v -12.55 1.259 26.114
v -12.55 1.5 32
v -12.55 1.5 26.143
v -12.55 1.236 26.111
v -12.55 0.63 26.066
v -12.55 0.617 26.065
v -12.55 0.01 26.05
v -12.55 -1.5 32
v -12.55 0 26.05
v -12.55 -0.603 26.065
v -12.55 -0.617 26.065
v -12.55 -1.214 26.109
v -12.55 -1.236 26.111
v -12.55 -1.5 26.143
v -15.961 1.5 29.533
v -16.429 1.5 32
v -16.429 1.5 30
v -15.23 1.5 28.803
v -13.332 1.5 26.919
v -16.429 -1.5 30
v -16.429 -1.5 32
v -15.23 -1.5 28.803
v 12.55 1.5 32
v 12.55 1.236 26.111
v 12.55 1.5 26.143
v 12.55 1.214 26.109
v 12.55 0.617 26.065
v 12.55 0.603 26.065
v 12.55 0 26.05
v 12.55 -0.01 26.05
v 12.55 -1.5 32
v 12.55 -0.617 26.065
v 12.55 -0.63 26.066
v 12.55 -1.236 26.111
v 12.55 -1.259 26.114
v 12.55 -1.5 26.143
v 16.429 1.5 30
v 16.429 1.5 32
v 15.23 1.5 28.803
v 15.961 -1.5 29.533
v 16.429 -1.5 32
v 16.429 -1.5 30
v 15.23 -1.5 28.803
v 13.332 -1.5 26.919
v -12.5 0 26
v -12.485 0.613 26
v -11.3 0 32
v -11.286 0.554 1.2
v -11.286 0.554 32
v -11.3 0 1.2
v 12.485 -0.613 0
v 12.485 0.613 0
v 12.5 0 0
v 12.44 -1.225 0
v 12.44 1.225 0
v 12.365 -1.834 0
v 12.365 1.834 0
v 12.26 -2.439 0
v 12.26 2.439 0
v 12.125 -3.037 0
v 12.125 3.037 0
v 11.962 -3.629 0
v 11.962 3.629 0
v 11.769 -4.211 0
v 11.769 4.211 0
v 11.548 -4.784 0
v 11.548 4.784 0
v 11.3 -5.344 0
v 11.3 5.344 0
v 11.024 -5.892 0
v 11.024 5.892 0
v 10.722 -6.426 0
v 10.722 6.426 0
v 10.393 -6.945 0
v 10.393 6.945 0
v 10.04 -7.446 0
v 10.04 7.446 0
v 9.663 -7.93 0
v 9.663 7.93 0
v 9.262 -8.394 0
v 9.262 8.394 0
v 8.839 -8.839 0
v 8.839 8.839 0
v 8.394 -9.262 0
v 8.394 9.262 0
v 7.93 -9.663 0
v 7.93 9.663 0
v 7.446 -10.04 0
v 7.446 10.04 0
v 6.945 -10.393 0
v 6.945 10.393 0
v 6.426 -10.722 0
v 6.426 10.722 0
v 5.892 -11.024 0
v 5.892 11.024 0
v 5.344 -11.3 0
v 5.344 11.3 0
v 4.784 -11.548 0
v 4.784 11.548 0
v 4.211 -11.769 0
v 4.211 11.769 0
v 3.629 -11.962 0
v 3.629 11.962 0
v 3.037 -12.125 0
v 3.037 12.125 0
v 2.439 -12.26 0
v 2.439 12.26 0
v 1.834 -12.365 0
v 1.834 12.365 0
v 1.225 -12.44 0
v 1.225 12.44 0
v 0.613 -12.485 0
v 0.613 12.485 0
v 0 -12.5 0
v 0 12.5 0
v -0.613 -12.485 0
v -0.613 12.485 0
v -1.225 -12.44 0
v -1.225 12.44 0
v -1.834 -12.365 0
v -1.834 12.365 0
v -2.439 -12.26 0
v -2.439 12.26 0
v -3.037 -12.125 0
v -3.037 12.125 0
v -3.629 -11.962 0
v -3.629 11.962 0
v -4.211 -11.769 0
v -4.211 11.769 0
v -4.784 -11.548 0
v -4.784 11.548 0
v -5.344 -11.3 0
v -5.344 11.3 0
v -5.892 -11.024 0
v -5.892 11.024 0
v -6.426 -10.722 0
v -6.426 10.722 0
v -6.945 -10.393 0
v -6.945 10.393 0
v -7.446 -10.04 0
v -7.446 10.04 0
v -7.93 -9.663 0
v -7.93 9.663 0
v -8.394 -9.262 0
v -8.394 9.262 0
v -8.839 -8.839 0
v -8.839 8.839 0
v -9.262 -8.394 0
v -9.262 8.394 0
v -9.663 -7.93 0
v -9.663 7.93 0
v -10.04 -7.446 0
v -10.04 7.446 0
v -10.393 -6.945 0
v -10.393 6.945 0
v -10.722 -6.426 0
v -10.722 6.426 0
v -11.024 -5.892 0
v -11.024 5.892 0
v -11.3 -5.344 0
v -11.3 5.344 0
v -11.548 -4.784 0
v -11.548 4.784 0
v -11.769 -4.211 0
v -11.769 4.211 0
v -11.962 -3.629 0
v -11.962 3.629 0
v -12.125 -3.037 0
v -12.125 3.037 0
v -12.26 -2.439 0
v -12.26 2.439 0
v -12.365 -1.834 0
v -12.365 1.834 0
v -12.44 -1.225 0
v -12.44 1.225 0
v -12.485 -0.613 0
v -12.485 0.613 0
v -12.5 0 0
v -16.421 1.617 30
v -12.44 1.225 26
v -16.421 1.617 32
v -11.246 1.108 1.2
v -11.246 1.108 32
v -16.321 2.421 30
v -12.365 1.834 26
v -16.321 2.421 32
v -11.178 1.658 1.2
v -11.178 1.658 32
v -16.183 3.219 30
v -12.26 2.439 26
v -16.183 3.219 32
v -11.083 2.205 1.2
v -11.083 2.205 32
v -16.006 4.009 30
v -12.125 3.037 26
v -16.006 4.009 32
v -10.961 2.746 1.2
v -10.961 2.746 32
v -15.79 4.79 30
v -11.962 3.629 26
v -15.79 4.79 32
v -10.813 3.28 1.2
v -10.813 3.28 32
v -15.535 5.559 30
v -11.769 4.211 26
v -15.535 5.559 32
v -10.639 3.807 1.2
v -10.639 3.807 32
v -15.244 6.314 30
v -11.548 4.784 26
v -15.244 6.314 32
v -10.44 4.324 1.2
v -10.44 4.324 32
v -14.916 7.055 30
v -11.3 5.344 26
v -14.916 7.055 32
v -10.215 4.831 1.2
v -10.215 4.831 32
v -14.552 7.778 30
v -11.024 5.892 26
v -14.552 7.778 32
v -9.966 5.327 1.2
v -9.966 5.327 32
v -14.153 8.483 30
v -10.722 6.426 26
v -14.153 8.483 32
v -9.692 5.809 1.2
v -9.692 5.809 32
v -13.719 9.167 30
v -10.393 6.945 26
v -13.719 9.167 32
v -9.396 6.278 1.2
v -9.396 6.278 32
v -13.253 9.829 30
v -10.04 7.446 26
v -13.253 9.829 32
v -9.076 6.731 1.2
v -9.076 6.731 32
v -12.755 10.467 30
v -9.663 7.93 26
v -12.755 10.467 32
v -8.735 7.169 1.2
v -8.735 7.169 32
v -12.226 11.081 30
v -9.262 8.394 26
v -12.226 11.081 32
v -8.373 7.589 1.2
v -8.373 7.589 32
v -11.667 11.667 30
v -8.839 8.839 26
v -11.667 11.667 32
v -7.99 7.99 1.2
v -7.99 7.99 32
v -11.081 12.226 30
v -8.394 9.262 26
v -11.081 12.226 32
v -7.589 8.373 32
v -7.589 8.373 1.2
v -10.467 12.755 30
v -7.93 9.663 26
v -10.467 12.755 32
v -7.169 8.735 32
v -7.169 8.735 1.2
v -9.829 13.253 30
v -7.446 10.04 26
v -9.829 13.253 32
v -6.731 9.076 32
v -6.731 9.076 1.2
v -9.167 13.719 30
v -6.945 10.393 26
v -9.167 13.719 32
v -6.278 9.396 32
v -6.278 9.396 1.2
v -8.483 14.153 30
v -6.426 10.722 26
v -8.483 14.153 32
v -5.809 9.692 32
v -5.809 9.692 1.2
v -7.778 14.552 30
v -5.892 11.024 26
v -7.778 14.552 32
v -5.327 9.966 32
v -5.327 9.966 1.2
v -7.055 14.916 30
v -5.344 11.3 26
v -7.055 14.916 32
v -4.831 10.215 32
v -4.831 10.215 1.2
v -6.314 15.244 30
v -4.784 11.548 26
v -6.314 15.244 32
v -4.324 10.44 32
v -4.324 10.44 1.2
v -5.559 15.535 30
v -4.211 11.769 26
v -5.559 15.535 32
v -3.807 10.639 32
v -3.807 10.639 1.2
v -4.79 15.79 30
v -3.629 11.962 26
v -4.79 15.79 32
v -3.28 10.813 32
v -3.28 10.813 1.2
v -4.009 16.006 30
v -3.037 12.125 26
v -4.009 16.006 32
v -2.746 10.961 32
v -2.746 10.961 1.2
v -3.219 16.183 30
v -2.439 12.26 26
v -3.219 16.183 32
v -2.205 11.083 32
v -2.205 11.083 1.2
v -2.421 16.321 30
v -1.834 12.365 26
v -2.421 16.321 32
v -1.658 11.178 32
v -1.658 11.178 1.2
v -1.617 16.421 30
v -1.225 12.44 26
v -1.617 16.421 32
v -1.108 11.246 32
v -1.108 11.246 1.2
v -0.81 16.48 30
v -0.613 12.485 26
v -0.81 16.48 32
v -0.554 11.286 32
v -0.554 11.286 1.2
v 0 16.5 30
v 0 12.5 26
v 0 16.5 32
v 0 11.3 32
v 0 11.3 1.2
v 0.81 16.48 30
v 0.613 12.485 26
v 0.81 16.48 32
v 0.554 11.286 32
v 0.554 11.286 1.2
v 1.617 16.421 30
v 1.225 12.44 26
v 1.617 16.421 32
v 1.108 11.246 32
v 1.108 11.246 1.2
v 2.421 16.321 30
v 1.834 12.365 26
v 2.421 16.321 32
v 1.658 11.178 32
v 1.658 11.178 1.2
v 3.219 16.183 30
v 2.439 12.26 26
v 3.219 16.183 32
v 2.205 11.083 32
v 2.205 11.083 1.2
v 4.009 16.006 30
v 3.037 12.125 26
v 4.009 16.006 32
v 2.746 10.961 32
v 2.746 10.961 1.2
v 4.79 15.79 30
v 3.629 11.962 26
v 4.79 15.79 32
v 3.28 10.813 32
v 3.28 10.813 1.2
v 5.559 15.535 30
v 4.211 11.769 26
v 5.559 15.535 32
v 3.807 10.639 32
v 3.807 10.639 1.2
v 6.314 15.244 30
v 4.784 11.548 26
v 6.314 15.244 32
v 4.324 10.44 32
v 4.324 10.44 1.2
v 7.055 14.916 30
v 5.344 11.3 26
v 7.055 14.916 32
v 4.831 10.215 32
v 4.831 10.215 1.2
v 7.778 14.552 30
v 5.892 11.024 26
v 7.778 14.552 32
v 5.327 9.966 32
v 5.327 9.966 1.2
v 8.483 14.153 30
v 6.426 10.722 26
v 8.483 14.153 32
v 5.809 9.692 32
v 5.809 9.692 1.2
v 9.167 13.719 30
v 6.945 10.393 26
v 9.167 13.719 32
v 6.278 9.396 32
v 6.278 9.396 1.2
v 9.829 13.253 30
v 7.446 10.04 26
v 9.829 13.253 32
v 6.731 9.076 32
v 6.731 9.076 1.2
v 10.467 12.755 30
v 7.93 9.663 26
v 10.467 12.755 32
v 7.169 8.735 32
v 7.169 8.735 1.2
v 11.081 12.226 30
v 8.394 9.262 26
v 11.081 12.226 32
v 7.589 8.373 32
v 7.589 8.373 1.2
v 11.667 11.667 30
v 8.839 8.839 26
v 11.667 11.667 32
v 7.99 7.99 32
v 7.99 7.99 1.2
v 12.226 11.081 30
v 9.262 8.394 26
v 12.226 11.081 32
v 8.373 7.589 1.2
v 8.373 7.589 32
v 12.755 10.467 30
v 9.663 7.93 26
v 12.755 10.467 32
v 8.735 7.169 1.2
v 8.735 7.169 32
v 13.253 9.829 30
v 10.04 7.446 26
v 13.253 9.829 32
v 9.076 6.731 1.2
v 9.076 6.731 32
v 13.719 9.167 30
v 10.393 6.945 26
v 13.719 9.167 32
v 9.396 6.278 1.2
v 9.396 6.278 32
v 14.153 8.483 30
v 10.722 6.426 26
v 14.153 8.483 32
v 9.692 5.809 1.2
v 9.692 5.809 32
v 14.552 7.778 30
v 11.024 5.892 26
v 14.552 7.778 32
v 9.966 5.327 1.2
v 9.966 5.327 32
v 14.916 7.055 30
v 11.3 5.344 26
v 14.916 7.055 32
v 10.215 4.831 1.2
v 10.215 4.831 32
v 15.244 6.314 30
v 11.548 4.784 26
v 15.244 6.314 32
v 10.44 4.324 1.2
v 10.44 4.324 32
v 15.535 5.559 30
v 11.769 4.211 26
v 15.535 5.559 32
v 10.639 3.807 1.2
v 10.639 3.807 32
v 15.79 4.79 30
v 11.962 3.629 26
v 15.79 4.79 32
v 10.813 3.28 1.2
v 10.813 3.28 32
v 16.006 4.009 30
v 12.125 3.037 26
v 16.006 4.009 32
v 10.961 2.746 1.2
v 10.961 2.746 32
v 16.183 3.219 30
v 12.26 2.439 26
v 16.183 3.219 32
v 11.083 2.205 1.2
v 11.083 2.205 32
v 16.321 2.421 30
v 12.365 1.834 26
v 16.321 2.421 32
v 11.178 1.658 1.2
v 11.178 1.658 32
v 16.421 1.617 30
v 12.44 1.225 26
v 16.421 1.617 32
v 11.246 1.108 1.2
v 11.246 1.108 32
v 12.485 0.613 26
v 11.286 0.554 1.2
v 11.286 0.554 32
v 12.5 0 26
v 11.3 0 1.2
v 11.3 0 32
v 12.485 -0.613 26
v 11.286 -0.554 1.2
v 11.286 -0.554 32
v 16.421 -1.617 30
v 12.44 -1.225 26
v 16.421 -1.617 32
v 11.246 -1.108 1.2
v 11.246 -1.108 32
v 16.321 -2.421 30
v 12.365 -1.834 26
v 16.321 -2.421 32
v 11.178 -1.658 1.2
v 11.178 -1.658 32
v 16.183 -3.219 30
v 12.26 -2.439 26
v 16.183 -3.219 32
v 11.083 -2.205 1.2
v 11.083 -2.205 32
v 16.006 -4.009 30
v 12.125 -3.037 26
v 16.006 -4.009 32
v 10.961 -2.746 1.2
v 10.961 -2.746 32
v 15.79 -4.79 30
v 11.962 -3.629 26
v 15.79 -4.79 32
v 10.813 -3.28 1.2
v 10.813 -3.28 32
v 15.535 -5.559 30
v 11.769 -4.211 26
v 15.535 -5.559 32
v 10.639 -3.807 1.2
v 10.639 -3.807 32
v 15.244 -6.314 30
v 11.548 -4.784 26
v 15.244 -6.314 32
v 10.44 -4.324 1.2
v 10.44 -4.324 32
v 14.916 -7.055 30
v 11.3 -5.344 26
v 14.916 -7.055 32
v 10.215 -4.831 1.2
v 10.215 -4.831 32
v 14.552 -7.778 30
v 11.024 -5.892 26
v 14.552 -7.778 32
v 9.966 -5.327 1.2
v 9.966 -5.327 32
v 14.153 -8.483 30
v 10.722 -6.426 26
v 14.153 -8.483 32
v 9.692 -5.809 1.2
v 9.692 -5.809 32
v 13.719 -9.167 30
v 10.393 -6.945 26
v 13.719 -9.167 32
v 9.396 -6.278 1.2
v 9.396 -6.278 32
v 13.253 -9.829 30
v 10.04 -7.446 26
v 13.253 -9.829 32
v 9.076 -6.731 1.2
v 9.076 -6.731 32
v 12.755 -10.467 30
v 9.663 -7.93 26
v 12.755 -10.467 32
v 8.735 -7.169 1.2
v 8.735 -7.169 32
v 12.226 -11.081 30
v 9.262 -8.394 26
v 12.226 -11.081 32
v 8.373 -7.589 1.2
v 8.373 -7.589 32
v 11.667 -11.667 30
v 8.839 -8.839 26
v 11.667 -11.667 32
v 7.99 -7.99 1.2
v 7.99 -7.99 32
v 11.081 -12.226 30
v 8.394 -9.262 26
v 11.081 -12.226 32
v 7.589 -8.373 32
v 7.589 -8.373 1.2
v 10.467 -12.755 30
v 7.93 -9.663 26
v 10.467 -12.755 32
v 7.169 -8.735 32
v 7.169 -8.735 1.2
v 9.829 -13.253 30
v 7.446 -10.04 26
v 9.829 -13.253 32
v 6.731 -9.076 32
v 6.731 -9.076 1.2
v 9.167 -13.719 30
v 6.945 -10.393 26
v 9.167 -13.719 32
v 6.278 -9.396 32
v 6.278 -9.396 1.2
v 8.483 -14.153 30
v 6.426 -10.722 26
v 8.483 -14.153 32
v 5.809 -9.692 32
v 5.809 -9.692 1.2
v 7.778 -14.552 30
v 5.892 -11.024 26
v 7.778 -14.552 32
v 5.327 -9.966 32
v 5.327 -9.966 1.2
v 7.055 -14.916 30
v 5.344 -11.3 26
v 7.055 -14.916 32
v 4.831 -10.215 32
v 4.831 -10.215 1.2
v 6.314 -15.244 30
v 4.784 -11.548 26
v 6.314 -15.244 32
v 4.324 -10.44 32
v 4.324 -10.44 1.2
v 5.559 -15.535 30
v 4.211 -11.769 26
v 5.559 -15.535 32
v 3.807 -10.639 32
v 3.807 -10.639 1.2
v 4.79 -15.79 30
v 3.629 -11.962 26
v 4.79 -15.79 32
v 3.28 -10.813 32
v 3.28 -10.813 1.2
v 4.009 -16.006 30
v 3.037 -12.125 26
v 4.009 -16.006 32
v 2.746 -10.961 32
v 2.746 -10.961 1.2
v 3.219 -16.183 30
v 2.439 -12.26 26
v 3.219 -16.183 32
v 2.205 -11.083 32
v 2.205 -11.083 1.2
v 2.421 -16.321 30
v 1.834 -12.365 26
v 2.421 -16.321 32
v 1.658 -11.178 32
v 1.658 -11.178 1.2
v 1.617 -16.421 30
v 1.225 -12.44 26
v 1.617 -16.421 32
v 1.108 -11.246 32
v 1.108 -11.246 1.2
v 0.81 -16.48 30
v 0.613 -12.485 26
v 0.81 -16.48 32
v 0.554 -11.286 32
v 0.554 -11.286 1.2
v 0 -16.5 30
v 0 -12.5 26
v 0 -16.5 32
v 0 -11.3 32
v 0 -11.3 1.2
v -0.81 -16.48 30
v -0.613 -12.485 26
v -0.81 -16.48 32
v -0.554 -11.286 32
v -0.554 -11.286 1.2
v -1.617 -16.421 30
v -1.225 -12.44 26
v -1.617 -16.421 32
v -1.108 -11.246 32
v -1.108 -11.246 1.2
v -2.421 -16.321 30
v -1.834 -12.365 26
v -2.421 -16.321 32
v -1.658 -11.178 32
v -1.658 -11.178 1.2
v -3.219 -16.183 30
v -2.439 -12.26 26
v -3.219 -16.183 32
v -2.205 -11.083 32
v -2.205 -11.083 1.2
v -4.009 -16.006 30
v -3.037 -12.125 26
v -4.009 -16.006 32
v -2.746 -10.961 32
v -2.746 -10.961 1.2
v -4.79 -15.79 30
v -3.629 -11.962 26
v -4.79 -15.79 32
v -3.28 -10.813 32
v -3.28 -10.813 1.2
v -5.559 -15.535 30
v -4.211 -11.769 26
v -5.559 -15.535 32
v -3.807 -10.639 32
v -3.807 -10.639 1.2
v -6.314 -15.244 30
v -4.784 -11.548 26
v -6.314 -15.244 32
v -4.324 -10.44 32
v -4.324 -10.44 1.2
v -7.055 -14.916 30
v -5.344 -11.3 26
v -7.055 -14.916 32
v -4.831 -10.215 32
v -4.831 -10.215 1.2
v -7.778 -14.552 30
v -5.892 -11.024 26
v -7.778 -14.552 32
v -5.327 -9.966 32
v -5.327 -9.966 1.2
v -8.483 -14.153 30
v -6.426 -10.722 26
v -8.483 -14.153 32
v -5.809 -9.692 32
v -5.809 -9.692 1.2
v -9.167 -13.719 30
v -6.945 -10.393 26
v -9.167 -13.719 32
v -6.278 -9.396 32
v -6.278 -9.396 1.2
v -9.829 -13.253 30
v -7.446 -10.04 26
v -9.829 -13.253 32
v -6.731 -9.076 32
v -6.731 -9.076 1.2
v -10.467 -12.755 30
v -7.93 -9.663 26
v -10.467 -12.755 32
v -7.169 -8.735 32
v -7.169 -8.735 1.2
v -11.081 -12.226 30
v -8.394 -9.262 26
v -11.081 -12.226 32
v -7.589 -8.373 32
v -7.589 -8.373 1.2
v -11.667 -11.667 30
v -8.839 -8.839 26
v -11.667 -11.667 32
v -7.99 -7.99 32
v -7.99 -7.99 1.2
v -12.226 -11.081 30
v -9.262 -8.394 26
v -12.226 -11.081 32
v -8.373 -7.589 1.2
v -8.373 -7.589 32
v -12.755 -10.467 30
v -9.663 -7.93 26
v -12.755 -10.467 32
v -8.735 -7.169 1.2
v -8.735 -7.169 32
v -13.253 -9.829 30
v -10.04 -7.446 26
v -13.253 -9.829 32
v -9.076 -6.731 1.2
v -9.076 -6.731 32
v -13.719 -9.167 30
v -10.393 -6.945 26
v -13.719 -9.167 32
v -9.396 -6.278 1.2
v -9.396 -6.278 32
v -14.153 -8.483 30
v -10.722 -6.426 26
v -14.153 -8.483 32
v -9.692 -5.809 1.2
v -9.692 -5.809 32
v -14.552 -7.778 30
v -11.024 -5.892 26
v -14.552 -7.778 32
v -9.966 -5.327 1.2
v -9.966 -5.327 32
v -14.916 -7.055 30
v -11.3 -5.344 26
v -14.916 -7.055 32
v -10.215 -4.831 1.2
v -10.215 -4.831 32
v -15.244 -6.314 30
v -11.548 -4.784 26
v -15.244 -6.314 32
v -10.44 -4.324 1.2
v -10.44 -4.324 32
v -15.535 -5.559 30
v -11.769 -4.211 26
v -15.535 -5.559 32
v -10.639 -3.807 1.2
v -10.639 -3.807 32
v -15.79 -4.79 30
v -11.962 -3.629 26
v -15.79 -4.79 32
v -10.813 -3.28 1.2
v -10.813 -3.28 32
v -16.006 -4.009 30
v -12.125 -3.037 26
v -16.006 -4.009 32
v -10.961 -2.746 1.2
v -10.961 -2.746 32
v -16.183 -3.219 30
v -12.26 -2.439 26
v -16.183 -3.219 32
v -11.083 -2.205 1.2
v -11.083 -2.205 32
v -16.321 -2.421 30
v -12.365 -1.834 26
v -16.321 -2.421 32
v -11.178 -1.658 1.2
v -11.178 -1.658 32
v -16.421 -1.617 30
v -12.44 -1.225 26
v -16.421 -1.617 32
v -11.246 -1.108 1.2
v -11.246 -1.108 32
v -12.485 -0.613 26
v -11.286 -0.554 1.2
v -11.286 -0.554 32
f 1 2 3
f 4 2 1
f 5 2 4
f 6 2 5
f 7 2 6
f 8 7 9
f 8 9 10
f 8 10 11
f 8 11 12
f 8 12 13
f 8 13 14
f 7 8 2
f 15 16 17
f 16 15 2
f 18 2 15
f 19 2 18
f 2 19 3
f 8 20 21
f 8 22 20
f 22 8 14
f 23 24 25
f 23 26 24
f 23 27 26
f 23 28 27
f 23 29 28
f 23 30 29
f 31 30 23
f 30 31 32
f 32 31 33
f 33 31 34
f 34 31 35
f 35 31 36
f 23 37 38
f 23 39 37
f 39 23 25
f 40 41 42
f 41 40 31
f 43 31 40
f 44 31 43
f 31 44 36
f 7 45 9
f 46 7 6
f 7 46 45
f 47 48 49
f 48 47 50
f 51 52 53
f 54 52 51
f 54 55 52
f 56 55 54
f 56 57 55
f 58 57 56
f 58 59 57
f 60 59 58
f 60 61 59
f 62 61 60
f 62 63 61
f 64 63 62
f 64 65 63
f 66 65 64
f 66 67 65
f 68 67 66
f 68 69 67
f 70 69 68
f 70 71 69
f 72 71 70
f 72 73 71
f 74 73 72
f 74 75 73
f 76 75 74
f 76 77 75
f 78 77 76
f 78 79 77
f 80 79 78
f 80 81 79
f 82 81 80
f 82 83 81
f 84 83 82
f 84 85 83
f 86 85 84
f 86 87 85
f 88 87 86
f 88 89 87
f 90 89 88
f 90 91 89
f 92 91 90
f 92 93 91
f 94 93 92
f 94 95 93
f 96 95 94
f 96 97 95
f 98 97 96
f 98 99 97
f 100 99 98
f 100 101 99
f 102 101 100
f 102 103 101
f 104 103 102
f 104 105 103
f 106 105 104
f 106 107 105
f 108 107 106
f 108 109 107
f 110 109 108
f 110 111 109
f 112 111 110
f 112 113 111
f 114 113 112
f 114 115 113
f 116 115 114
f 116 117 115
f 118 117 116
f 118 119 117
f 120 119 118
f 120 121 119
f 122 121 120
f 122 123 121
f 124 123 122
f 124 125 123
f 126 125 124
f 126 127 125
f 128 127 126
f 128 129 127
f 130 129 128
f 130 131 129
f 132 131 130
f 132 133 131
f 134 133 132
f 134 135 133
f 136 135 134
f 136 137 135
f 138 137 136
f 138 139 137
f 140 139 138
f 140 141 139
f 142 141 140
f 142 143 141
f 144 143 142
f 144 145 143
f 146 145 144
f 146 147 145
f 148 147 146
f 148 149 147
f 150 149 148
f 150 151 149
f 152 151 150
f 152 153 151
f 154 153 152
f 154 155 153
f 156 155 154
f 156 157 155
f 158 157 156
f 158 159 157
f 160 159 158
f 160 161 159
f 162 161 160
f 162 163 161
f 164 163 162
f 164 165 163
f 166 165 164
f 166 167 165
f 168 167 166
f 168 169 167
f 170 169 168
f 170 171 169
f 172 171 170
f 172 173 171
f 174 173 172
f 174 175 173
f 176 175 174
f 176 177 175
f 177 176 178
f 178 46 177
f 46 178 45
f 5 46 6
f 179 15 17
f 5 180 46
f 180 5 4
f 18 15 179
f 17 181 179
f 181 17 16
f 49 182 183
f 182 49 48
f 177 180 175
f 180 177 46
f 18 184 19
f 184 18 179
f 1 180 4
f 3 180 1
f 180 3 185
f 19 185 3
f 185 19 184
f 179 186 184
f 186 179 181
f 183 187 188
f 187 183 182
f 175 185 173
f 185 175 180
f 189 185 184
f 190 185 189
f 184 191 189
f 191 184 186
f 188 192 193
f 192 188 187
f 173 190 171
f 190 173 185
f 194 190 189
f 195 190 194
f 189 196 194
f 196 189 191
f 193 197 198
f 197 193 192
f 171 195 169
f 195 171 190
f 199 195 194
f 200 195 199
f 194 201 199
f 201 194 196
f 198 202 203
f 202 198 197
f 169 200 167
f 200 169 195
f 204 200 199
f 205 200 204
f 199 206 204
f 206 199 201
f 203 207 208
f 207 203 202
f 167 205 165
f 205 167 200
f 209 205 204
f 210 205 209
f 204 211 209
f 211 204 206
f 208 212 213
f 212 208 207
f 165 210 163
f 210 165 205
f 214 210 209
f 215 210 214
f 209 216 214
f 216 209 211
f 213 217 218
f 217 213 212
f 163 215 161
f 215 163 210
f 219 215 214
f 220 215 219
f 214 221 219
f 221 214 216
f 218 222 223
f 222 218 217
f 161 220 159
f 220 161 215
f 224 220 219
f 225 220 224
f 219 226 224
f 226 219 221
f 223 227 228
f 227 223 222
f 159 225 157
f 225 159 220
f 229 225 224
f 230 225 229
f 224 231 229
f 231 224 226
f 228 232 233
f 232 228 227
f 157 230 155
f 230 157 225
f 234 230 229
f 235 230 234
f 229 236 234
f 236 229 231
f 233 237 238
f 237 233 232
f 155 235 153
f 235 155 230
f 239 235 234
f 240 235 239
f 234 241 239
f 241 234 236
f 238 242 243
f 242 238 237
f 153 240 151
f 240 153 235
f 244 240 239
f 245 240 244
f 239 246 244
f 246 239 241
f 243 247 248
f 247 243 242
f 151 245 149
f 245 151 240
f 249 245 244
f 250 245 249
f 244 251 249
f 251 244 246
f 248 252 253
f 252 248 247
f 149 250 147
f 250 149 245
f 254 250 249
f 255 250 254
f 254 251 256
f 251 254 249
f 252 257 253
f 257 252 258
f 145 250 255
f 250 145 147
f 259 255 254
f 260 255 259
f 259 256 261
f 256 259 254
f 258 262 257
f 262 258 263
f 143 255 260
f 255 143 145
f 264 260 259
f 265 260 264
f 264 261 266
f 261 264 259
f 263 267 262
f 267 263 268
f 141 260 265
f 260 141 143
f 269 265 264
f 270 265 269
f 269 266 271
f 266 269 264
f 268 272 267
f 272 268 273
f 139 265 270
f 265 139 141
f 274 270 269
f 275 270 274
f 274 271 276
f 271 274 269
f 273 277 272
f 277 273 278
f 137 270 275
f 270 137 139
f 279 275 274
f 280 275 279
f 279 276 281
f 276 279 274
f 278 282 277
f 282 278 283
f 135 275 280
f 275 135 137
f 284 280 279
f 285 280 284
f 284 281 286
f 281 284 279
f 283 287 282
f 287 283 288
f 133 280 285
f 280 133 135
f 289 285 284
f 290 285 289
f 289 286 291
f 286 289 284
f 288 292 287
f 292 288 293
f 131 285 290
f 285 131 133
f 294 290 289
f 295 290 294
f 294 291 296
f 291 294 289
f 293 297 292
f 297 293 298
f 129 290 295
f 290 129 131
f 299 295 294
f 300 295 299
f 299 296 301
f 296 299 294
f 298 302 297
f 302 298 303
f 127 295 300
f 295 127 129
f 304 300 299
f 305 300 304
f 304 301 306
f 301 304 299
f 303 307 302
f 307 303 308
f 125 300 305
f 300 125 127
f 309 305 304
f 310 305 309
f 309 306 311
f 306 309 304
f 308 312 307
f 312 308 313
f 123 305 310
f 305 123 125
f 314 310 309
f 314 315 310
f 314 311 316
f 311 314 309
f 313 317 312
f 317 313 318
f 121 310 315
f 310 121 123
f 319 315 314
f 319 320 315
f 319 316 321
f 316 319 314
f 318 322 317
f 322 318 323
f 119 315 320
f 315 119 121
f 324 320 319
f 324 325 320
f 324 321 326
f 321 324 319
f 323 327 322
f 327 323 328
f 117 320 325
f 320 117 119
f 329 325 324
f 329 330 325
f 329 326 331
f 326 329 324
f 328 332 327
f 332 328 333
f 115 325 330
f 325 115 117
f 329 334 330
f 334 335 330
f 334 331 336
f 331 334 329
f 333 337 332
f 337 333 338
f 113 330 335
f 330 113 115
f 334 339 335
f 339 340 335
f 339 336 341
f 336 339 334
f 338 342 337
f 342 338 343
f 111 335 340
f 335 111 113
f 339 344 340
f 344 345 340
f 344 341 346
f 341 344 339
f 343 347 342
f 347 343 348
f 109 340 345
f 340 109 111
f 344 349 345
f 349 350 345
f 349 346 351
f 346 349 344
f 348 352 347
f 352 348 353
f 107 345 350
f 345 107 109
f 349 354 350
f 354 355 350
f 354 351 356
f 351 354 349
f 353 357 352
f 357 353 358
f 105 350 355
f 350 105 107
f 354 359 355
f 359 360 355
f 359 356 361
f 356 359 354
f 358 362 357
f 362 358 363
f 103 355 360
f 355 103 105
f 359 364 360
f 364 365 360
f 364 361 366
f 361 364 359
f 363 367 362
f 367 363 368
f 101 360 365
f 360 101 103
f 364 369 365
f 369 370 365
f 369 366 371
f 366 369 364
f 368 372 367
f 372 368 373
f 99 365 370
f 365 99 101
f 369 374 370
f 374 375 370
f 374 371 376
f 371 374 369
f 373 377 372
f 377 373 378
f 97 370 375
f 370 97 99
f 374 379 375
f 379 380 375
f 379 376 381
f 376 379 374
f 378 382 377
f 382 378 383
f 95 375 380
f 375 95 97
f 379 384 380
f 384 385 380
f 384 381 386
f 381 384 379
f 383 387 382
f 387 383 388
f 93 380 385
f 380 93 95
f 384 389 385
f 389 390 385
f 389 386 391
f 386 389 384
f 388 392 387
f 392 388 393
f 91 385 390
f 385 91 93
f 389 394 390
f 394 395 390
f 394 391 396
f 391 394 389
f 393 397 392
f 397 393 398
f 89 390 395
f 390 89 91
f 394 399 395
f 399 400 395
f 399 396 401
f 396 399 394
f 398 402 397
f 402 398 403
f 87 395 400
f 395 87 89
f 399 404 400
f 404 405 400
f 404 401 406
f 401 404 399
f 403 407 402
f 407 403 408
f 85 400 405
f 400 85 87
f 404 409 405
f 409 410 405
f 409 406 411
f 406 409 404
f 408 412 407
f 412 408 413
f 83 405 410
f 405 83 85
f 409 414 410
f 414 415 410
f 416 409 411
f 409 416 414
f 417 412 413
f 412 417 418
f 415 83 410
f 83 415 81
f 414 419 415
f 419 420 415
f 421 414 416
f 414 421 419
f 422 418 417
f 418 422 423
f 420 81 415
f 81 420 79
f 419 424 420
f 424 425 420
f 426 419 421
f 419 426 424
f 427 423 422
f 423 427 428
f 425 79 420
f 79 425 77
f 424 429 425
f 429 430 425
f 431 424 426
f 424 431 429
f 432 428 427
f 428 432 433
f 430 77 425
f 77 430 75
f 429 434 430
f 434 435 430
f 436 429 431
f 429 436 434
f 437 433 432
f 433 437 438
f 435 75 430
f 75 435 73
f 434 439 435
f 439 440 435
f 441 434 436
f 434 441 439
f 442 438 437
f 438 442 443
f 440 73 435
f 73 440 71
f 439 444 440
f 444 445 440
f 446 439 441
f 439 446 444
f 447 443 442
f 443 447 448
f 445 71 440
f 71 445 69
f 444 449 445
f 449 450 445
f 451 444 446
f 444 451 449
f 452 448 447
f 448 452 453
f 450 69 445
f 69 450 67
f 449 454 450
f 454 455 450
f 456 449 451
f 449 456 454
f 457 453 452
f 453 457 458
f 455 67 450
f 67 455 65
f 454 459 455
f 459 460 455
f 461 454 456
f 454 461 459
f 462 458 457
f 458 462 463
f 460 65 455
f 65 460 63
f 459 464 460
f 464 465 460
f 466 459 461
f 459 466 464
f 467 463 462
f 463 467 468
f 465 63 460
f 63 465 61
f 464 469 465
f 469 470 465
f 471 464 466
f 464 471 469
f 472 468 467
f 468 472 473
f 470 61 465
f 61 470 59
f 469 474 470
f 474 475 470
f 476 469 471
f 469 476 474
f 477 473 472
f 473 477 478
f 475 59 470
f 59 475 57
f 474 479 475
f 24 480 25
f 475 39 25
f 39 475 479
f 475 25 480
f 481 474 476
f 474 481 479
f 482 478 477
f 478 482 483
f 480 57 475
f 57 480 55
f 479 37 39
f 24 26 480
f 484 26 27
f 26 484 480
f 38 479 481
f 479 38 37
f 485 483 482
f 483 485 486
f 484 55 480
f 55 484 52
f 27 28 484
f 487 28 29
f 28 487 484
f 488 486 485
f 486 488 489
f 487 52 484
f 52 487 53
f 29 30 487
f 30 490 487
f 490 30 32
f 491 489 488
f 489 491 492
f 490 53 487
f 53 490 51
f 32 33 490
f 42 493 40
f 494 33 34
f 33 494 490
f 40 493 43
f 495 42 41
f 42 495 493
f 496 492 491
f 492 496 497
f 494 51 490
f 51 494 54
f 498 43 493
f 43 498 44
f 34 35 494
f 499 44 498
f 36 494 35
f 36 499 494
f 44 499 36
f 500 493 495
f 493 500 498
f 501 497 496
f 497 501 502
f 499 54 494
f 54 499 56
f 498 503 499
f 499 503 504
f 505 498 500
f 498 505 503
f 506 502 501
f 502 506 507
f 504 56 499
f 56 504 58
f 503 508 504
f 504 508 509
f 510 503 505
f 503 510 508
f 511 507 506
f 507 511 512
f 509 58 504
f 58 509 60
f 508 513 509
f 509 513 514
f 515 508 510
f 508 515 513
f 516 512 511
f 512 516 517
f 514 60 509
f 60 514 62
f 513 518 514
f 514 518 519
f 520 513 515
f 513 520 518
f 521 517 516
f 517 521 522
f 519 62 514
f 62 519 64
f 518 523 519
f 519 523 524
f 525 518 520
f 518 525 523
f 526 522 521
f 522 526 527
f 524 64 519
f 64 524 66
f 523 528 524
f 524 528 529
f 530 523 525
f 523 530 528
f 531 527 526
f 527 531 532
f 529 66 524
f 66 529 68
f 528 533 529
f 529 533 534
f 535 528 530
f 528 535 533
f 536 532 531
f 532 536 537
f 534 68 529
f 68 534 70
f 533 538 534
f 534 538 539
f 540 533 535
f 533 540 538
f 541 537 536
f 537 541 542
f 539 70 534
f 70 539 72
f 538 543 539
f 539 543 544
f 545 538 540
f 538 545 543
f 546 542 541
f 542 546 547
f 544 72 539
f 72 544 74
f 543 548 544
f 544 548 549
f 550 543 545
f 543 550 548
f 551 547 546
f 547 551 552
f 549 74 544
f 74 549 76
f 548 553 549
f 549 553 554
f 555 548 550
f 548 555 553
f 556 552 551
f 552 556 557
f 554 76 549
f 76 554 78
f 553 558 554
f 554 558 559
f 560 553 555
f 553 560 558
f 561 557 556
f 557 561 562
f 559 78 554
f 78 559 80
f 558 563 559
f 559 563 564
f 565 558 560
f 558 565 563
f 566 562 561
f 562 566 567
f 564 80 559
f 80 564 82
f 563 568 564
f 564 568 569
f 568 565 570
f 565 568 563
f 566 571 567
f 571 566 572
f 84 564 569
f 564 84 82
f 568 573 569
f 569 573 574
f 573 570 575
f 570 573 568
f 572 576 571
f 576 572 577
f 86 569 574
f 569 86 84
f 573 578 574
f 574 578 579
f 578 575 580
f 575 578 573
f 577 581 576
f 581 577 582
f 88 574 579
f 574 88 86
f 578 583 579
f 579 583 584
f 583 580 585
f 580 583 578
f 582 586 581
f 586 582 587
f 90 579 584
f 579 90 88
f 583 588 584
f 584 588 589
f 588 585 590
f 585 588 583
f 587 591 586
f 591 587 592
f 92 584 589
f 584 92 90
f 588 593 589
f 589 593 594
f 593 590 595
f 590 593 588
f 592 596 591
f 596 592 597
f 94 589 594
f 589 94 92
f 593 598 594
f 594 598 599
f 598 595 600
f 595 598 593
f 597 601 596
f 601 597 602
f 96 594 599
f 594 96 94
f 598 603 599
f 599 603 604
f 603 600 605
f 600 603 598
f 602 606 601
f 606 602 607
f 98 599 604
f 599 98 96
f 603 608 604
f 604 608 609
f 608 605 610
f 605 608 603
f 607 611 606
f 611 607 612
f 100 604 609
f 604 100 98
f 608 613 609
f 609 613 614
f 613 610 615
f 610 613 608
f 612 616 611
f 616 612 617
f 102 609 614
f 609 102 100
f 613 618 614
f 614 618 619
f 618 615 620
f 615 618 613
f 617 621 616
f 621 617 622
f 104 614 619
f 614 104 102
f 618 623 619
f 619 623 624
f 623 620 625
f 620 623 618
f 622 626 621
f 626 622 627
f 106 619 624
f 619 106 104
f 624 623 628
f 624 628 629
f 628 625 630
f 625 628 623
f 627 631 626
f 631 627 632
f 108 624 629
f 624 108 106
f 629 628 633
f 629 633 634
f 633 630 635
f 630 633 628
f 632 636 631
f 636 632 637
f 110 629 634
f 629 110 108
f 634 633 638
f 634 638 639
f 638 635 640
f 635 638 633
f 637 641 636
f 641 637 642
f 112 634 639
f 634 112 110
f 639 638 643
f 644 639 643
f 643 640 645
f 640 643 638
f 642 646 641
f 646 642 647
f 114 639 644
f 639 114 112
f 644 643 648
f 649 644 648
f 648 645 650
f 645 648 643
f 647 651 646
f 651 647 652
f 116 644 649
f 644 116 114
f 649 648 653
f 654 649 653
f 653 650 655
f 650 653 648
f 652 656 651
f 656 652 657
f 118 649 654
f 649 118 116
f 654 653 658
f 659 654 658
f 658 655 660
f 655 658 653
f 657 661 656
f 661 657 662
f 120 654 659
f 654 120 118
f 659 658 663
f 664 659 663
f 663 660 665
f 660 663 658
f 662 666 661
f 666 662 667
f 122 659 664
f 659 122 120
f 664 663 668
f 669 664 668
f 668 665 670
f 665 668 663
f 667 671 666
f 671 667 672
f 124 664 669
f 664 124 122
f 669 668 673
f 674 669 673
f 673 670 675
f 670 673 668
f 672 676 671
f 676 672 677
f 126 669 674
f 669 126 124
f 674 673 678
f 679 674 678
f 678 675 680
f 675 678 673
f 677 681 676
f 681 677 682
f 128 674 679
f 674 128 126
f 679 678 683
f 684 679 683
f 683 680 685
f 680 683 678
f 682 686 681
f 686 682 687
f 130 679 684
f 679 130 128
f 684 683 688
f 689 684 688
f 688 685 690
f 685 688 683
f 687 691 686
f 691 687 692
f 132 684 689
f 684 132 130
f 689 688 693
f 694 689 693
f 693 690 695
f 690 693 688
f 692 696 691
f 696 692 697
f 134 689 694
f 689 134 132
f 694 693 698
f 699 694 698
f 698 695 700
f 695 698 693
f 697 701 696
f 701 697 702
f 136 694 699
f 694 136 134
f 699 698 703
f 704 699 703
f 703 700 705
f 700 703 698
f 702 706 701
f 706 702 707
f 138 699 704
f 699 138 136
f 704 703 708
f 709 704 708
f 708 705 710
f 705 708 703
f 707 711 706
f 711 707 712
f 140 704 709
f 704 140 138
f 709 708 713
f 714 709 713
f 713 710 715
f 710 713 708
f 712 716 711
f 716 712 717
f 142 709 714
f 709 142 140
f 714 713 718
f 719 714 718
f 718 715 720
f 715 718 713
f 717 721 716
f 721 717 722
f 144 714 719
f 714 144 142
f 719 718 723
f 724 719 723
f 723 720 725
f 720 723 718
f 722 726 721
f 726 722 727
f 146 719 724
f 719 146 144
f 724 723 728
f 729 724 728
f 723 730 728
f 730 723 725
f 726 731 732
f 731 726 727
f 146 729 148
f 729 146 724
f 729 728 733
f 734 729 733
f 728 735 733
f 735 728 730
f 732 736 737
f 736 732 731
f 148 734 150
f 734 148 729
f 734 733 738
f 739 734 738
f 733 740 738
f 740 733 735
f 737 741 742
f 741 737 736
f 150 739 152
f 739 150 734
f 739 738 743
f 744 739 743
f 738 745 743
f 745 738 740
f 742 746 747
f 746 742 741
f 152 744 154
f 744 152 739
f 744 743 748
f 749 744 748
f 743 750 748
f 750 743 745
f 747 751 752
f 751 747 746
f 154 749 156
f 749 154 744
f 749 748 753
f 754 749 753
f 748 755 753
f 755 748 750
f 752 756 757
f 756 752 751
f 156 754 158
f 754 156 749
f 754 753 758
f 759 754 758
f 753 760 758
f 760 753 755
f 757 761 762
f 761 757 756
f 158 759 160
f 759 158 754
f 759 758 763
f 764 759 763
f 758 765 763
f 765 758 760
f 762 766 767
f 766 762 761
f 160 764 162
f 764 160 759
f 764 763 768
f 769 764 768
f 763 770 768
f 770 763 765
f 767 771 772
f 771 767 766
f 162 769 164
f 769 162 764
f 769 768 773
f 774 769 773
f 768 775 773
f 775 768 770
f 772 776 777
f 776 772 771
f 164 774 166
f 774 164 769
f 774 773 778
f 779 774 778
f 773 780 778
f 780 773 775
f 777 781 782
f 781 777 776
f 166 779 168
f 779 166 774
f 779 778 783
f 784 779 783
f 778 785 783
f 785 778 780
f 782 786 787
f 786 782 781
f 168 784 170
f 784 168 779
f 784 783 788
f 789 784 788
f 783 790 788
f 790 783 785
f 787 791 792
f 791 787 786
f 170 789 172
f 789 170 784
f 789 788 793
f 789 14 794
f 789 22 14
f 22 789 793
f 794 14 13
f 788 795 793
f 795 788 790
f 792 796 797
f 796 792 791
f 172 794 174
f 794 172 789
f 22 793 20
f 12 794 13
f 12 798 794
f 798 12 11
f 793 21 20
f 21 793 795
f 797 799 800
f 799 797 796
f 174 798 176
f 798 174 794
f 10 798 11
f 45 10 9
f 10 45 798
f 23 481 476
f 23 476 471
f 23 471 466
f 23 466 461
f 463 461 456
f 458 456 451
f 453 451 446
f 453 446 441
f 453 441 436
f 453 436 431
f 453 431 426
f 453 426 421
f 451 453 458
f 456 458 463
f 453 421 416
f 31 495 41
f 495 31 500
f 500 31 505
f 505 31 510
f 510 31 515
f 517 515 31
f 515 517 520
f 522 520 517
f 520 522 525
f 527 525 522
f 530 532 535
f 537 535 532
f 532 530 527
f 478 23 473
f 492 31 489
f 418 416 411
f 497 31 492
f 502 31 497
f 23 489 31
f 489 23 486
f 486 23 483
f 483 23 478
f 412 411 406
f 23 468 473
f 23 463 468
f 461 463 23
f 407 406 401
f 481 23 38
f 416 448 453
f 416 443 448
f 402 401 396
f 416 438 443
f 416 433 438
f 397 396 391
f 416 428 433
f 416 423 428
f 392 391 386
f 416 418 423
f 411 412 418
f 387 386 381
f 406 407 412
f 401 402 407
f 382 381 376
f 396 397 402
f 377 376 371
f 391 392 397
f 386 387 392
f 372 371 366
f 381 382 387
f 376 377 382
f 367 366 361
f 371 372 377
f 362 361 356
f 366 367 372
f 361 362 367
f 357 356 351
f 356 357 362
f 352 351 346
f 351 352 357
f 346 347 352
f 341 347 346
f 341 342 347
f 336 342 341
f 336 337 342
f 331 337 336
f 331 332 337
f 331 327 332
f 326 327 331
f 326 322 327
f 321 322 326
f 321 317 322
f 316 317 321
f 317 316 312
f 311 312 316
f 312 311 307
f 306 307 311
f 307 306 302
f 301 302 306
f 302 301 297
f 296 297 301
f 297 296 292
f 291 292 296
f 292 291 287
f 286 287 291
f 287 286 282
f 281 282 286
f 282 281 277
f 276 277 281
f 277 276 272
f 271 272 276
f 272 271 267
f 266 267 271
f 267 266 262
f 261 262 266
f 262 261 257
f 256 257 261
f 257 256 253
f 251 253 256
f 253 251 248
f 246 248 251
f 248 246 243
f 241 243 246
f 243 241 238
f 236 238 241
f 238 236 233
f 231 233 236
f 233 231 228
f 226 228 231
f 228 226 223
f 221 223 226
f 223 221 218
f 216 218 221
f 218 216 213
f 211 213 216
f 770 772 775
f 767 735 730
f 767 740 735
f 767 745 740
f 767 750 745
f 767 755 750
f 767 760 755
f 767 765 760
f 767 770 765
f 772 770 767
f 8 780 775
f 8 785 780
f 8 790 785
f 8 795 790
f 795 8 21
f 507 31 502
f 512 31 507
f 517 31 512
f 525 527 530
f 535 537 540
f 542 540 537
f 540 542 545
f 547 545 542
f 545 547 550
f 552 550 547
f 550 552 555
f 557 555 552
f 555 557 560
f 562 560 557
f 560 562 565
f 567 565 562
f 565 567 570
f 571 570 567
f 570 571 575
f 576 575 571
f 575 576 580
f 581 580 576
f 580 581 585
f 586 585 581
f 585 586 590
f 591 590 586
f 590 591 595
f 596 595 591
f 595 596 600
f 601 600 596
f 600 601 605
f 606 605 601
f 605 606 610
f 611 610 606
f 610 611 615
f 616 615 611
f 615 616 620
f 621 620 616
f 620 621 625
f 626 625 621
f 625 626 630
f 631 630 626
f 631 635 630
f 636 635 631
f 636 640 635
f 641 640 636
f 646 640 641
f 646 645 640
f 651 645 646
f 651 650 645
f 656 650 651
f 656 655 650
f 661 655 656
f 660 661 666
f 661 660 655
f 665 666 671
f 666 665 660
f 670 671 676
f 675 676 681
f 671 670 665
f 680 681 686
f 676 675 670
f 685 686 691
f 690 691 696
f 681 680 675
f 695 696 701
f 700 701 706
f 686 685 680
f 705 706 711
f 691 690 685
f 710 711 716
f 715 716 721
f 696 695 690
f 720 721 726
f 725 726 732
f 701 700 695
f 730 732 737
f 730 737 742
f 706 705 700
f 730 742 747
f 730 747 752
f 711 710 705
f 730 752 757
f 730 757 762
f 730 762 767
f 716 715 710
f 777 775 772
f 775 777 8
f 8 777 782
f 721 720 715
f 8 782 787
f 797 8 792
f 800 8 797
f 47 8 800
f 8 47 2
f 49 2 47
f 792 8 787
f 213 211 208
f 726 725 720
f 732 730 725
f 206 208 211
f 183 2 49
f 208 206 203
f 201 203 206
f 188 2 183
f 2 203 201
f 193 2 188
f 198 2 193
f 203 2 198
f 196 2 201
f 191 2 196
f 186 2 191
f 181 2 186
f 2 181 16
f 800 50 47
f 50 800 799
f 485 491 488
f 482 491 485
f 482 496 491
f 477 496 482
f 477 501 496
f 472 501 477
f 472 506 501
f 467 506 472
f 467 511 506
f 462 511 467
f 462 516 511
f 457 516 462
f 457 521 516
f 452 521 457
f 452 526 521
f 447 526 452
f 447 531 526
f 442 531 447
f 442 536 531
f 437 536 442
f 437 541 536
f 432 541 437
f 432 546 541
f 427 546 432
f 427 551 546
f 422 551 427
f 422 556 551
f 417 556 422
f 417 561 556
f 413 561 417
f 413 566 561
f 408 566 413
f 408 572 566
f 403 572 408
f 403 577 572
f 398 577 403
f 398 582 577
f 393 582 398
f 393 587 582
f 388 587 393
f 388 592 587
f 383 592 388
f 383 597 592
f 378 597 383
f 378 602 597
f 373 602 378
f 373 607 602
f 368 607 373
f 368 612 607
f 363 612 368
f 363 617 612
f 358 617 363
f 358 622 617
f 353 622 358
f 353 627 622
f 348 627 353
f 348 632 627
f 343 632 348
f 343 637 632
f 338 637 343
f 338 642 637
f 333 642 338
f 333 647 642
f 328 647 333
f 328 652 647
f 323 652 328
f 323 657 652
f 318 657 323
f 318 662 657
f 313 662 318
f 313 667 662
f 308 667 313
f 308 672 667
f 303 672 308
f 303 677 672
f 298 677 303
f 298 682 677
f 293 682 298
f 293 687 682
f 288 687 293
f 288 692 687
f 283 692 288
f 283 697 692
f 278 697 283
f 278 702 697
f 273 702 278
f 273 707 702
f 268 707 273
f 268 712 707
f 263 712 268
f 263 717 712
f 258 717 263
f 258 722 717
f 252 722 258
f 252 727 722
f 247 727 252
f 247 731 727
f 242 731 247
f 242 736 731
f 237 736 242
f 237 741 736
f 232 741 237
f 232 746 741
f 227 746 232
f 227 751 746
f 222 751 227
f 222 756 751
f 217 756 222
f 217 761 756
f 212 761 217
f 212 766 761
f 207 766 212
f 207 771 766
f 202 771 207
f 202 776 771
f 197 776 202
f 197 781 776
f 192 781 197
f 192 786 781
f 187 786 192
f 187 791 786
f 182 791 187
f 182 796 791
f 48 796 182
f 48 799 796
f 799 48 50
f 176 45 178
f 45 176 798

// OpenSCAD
// KNOWN-WRONG PART (must fail): the floor is not perforated
// Coarse cell strainer that hangs in the mouth of a 50 mL conical tube
// Category: tools. A thin-walled cup with a perforated floor (81 x 1 mm holes on a 2 mm grid) and
// a 45-degree collar that rests on the tube's rim; two vent notches let air out of the tube.
// Print: PETG or PP, upright, 0.1-0.15 mm layers, 0.4 mm nozzle, 3 perimeters; check the holes
// are open after printing. For coarse filtration only (tissue debris), not a 40-100 um strainer.
// SPDX-License-Identifier: CERN-OHL-P-2.0

/* [Strainer] */
cup_od = 25;
wall = 1.2;               // bore 22.6
height = 32;
floor_t = 1.2;
collar = [26, 30];        // 45-degree cone from 25 mm at z = 26 to 33 mm at z = 30
rim_d = 33;               // rim from z = 30 to 32
hole_d = 1.0;
hole_pitch = 2;
hole_r_max = 10;          // keep holes whose centre is within 10 mm of the axis
vent_w = 3;
vent_r = 12.5;            // vents remove the collar beyond this radius ...
vent_z = 25;              // ... from this height up

/* [Hidden] */
eps = 0.01;
bore_r = cup_od / 2 - wall;
n = floor(hole_r_max / hole_pitch);

difference() {
    rotate_extrude($fn = 128) polygon([[0, 0], [cup_od / 2, 0], [cup_od / 2, collar[0]], [rim_d / 2, collar[1]],
                                       [rim_d / 2, height], [bore_r, height], [bore_r, floor_t], [0, floor_t]]);
    for (i = [-n : n], j = [-n : n])
        if (false)
            translate([i * hole_pitch, j * hole_pitch, -1]) cylinder(d = hole_d, h = floor_t + 2, $fn = 16);
    for (s = [-1, 1])
        translate([s > 0 ? vent_r + 0.05 : -rim_d / 2 - 1, -vent_w / 2, vent_z])
            cube([rim_d / 2 + 1 - vent_r - 0.05, vent_w, height - vent_z + 1]);
}
